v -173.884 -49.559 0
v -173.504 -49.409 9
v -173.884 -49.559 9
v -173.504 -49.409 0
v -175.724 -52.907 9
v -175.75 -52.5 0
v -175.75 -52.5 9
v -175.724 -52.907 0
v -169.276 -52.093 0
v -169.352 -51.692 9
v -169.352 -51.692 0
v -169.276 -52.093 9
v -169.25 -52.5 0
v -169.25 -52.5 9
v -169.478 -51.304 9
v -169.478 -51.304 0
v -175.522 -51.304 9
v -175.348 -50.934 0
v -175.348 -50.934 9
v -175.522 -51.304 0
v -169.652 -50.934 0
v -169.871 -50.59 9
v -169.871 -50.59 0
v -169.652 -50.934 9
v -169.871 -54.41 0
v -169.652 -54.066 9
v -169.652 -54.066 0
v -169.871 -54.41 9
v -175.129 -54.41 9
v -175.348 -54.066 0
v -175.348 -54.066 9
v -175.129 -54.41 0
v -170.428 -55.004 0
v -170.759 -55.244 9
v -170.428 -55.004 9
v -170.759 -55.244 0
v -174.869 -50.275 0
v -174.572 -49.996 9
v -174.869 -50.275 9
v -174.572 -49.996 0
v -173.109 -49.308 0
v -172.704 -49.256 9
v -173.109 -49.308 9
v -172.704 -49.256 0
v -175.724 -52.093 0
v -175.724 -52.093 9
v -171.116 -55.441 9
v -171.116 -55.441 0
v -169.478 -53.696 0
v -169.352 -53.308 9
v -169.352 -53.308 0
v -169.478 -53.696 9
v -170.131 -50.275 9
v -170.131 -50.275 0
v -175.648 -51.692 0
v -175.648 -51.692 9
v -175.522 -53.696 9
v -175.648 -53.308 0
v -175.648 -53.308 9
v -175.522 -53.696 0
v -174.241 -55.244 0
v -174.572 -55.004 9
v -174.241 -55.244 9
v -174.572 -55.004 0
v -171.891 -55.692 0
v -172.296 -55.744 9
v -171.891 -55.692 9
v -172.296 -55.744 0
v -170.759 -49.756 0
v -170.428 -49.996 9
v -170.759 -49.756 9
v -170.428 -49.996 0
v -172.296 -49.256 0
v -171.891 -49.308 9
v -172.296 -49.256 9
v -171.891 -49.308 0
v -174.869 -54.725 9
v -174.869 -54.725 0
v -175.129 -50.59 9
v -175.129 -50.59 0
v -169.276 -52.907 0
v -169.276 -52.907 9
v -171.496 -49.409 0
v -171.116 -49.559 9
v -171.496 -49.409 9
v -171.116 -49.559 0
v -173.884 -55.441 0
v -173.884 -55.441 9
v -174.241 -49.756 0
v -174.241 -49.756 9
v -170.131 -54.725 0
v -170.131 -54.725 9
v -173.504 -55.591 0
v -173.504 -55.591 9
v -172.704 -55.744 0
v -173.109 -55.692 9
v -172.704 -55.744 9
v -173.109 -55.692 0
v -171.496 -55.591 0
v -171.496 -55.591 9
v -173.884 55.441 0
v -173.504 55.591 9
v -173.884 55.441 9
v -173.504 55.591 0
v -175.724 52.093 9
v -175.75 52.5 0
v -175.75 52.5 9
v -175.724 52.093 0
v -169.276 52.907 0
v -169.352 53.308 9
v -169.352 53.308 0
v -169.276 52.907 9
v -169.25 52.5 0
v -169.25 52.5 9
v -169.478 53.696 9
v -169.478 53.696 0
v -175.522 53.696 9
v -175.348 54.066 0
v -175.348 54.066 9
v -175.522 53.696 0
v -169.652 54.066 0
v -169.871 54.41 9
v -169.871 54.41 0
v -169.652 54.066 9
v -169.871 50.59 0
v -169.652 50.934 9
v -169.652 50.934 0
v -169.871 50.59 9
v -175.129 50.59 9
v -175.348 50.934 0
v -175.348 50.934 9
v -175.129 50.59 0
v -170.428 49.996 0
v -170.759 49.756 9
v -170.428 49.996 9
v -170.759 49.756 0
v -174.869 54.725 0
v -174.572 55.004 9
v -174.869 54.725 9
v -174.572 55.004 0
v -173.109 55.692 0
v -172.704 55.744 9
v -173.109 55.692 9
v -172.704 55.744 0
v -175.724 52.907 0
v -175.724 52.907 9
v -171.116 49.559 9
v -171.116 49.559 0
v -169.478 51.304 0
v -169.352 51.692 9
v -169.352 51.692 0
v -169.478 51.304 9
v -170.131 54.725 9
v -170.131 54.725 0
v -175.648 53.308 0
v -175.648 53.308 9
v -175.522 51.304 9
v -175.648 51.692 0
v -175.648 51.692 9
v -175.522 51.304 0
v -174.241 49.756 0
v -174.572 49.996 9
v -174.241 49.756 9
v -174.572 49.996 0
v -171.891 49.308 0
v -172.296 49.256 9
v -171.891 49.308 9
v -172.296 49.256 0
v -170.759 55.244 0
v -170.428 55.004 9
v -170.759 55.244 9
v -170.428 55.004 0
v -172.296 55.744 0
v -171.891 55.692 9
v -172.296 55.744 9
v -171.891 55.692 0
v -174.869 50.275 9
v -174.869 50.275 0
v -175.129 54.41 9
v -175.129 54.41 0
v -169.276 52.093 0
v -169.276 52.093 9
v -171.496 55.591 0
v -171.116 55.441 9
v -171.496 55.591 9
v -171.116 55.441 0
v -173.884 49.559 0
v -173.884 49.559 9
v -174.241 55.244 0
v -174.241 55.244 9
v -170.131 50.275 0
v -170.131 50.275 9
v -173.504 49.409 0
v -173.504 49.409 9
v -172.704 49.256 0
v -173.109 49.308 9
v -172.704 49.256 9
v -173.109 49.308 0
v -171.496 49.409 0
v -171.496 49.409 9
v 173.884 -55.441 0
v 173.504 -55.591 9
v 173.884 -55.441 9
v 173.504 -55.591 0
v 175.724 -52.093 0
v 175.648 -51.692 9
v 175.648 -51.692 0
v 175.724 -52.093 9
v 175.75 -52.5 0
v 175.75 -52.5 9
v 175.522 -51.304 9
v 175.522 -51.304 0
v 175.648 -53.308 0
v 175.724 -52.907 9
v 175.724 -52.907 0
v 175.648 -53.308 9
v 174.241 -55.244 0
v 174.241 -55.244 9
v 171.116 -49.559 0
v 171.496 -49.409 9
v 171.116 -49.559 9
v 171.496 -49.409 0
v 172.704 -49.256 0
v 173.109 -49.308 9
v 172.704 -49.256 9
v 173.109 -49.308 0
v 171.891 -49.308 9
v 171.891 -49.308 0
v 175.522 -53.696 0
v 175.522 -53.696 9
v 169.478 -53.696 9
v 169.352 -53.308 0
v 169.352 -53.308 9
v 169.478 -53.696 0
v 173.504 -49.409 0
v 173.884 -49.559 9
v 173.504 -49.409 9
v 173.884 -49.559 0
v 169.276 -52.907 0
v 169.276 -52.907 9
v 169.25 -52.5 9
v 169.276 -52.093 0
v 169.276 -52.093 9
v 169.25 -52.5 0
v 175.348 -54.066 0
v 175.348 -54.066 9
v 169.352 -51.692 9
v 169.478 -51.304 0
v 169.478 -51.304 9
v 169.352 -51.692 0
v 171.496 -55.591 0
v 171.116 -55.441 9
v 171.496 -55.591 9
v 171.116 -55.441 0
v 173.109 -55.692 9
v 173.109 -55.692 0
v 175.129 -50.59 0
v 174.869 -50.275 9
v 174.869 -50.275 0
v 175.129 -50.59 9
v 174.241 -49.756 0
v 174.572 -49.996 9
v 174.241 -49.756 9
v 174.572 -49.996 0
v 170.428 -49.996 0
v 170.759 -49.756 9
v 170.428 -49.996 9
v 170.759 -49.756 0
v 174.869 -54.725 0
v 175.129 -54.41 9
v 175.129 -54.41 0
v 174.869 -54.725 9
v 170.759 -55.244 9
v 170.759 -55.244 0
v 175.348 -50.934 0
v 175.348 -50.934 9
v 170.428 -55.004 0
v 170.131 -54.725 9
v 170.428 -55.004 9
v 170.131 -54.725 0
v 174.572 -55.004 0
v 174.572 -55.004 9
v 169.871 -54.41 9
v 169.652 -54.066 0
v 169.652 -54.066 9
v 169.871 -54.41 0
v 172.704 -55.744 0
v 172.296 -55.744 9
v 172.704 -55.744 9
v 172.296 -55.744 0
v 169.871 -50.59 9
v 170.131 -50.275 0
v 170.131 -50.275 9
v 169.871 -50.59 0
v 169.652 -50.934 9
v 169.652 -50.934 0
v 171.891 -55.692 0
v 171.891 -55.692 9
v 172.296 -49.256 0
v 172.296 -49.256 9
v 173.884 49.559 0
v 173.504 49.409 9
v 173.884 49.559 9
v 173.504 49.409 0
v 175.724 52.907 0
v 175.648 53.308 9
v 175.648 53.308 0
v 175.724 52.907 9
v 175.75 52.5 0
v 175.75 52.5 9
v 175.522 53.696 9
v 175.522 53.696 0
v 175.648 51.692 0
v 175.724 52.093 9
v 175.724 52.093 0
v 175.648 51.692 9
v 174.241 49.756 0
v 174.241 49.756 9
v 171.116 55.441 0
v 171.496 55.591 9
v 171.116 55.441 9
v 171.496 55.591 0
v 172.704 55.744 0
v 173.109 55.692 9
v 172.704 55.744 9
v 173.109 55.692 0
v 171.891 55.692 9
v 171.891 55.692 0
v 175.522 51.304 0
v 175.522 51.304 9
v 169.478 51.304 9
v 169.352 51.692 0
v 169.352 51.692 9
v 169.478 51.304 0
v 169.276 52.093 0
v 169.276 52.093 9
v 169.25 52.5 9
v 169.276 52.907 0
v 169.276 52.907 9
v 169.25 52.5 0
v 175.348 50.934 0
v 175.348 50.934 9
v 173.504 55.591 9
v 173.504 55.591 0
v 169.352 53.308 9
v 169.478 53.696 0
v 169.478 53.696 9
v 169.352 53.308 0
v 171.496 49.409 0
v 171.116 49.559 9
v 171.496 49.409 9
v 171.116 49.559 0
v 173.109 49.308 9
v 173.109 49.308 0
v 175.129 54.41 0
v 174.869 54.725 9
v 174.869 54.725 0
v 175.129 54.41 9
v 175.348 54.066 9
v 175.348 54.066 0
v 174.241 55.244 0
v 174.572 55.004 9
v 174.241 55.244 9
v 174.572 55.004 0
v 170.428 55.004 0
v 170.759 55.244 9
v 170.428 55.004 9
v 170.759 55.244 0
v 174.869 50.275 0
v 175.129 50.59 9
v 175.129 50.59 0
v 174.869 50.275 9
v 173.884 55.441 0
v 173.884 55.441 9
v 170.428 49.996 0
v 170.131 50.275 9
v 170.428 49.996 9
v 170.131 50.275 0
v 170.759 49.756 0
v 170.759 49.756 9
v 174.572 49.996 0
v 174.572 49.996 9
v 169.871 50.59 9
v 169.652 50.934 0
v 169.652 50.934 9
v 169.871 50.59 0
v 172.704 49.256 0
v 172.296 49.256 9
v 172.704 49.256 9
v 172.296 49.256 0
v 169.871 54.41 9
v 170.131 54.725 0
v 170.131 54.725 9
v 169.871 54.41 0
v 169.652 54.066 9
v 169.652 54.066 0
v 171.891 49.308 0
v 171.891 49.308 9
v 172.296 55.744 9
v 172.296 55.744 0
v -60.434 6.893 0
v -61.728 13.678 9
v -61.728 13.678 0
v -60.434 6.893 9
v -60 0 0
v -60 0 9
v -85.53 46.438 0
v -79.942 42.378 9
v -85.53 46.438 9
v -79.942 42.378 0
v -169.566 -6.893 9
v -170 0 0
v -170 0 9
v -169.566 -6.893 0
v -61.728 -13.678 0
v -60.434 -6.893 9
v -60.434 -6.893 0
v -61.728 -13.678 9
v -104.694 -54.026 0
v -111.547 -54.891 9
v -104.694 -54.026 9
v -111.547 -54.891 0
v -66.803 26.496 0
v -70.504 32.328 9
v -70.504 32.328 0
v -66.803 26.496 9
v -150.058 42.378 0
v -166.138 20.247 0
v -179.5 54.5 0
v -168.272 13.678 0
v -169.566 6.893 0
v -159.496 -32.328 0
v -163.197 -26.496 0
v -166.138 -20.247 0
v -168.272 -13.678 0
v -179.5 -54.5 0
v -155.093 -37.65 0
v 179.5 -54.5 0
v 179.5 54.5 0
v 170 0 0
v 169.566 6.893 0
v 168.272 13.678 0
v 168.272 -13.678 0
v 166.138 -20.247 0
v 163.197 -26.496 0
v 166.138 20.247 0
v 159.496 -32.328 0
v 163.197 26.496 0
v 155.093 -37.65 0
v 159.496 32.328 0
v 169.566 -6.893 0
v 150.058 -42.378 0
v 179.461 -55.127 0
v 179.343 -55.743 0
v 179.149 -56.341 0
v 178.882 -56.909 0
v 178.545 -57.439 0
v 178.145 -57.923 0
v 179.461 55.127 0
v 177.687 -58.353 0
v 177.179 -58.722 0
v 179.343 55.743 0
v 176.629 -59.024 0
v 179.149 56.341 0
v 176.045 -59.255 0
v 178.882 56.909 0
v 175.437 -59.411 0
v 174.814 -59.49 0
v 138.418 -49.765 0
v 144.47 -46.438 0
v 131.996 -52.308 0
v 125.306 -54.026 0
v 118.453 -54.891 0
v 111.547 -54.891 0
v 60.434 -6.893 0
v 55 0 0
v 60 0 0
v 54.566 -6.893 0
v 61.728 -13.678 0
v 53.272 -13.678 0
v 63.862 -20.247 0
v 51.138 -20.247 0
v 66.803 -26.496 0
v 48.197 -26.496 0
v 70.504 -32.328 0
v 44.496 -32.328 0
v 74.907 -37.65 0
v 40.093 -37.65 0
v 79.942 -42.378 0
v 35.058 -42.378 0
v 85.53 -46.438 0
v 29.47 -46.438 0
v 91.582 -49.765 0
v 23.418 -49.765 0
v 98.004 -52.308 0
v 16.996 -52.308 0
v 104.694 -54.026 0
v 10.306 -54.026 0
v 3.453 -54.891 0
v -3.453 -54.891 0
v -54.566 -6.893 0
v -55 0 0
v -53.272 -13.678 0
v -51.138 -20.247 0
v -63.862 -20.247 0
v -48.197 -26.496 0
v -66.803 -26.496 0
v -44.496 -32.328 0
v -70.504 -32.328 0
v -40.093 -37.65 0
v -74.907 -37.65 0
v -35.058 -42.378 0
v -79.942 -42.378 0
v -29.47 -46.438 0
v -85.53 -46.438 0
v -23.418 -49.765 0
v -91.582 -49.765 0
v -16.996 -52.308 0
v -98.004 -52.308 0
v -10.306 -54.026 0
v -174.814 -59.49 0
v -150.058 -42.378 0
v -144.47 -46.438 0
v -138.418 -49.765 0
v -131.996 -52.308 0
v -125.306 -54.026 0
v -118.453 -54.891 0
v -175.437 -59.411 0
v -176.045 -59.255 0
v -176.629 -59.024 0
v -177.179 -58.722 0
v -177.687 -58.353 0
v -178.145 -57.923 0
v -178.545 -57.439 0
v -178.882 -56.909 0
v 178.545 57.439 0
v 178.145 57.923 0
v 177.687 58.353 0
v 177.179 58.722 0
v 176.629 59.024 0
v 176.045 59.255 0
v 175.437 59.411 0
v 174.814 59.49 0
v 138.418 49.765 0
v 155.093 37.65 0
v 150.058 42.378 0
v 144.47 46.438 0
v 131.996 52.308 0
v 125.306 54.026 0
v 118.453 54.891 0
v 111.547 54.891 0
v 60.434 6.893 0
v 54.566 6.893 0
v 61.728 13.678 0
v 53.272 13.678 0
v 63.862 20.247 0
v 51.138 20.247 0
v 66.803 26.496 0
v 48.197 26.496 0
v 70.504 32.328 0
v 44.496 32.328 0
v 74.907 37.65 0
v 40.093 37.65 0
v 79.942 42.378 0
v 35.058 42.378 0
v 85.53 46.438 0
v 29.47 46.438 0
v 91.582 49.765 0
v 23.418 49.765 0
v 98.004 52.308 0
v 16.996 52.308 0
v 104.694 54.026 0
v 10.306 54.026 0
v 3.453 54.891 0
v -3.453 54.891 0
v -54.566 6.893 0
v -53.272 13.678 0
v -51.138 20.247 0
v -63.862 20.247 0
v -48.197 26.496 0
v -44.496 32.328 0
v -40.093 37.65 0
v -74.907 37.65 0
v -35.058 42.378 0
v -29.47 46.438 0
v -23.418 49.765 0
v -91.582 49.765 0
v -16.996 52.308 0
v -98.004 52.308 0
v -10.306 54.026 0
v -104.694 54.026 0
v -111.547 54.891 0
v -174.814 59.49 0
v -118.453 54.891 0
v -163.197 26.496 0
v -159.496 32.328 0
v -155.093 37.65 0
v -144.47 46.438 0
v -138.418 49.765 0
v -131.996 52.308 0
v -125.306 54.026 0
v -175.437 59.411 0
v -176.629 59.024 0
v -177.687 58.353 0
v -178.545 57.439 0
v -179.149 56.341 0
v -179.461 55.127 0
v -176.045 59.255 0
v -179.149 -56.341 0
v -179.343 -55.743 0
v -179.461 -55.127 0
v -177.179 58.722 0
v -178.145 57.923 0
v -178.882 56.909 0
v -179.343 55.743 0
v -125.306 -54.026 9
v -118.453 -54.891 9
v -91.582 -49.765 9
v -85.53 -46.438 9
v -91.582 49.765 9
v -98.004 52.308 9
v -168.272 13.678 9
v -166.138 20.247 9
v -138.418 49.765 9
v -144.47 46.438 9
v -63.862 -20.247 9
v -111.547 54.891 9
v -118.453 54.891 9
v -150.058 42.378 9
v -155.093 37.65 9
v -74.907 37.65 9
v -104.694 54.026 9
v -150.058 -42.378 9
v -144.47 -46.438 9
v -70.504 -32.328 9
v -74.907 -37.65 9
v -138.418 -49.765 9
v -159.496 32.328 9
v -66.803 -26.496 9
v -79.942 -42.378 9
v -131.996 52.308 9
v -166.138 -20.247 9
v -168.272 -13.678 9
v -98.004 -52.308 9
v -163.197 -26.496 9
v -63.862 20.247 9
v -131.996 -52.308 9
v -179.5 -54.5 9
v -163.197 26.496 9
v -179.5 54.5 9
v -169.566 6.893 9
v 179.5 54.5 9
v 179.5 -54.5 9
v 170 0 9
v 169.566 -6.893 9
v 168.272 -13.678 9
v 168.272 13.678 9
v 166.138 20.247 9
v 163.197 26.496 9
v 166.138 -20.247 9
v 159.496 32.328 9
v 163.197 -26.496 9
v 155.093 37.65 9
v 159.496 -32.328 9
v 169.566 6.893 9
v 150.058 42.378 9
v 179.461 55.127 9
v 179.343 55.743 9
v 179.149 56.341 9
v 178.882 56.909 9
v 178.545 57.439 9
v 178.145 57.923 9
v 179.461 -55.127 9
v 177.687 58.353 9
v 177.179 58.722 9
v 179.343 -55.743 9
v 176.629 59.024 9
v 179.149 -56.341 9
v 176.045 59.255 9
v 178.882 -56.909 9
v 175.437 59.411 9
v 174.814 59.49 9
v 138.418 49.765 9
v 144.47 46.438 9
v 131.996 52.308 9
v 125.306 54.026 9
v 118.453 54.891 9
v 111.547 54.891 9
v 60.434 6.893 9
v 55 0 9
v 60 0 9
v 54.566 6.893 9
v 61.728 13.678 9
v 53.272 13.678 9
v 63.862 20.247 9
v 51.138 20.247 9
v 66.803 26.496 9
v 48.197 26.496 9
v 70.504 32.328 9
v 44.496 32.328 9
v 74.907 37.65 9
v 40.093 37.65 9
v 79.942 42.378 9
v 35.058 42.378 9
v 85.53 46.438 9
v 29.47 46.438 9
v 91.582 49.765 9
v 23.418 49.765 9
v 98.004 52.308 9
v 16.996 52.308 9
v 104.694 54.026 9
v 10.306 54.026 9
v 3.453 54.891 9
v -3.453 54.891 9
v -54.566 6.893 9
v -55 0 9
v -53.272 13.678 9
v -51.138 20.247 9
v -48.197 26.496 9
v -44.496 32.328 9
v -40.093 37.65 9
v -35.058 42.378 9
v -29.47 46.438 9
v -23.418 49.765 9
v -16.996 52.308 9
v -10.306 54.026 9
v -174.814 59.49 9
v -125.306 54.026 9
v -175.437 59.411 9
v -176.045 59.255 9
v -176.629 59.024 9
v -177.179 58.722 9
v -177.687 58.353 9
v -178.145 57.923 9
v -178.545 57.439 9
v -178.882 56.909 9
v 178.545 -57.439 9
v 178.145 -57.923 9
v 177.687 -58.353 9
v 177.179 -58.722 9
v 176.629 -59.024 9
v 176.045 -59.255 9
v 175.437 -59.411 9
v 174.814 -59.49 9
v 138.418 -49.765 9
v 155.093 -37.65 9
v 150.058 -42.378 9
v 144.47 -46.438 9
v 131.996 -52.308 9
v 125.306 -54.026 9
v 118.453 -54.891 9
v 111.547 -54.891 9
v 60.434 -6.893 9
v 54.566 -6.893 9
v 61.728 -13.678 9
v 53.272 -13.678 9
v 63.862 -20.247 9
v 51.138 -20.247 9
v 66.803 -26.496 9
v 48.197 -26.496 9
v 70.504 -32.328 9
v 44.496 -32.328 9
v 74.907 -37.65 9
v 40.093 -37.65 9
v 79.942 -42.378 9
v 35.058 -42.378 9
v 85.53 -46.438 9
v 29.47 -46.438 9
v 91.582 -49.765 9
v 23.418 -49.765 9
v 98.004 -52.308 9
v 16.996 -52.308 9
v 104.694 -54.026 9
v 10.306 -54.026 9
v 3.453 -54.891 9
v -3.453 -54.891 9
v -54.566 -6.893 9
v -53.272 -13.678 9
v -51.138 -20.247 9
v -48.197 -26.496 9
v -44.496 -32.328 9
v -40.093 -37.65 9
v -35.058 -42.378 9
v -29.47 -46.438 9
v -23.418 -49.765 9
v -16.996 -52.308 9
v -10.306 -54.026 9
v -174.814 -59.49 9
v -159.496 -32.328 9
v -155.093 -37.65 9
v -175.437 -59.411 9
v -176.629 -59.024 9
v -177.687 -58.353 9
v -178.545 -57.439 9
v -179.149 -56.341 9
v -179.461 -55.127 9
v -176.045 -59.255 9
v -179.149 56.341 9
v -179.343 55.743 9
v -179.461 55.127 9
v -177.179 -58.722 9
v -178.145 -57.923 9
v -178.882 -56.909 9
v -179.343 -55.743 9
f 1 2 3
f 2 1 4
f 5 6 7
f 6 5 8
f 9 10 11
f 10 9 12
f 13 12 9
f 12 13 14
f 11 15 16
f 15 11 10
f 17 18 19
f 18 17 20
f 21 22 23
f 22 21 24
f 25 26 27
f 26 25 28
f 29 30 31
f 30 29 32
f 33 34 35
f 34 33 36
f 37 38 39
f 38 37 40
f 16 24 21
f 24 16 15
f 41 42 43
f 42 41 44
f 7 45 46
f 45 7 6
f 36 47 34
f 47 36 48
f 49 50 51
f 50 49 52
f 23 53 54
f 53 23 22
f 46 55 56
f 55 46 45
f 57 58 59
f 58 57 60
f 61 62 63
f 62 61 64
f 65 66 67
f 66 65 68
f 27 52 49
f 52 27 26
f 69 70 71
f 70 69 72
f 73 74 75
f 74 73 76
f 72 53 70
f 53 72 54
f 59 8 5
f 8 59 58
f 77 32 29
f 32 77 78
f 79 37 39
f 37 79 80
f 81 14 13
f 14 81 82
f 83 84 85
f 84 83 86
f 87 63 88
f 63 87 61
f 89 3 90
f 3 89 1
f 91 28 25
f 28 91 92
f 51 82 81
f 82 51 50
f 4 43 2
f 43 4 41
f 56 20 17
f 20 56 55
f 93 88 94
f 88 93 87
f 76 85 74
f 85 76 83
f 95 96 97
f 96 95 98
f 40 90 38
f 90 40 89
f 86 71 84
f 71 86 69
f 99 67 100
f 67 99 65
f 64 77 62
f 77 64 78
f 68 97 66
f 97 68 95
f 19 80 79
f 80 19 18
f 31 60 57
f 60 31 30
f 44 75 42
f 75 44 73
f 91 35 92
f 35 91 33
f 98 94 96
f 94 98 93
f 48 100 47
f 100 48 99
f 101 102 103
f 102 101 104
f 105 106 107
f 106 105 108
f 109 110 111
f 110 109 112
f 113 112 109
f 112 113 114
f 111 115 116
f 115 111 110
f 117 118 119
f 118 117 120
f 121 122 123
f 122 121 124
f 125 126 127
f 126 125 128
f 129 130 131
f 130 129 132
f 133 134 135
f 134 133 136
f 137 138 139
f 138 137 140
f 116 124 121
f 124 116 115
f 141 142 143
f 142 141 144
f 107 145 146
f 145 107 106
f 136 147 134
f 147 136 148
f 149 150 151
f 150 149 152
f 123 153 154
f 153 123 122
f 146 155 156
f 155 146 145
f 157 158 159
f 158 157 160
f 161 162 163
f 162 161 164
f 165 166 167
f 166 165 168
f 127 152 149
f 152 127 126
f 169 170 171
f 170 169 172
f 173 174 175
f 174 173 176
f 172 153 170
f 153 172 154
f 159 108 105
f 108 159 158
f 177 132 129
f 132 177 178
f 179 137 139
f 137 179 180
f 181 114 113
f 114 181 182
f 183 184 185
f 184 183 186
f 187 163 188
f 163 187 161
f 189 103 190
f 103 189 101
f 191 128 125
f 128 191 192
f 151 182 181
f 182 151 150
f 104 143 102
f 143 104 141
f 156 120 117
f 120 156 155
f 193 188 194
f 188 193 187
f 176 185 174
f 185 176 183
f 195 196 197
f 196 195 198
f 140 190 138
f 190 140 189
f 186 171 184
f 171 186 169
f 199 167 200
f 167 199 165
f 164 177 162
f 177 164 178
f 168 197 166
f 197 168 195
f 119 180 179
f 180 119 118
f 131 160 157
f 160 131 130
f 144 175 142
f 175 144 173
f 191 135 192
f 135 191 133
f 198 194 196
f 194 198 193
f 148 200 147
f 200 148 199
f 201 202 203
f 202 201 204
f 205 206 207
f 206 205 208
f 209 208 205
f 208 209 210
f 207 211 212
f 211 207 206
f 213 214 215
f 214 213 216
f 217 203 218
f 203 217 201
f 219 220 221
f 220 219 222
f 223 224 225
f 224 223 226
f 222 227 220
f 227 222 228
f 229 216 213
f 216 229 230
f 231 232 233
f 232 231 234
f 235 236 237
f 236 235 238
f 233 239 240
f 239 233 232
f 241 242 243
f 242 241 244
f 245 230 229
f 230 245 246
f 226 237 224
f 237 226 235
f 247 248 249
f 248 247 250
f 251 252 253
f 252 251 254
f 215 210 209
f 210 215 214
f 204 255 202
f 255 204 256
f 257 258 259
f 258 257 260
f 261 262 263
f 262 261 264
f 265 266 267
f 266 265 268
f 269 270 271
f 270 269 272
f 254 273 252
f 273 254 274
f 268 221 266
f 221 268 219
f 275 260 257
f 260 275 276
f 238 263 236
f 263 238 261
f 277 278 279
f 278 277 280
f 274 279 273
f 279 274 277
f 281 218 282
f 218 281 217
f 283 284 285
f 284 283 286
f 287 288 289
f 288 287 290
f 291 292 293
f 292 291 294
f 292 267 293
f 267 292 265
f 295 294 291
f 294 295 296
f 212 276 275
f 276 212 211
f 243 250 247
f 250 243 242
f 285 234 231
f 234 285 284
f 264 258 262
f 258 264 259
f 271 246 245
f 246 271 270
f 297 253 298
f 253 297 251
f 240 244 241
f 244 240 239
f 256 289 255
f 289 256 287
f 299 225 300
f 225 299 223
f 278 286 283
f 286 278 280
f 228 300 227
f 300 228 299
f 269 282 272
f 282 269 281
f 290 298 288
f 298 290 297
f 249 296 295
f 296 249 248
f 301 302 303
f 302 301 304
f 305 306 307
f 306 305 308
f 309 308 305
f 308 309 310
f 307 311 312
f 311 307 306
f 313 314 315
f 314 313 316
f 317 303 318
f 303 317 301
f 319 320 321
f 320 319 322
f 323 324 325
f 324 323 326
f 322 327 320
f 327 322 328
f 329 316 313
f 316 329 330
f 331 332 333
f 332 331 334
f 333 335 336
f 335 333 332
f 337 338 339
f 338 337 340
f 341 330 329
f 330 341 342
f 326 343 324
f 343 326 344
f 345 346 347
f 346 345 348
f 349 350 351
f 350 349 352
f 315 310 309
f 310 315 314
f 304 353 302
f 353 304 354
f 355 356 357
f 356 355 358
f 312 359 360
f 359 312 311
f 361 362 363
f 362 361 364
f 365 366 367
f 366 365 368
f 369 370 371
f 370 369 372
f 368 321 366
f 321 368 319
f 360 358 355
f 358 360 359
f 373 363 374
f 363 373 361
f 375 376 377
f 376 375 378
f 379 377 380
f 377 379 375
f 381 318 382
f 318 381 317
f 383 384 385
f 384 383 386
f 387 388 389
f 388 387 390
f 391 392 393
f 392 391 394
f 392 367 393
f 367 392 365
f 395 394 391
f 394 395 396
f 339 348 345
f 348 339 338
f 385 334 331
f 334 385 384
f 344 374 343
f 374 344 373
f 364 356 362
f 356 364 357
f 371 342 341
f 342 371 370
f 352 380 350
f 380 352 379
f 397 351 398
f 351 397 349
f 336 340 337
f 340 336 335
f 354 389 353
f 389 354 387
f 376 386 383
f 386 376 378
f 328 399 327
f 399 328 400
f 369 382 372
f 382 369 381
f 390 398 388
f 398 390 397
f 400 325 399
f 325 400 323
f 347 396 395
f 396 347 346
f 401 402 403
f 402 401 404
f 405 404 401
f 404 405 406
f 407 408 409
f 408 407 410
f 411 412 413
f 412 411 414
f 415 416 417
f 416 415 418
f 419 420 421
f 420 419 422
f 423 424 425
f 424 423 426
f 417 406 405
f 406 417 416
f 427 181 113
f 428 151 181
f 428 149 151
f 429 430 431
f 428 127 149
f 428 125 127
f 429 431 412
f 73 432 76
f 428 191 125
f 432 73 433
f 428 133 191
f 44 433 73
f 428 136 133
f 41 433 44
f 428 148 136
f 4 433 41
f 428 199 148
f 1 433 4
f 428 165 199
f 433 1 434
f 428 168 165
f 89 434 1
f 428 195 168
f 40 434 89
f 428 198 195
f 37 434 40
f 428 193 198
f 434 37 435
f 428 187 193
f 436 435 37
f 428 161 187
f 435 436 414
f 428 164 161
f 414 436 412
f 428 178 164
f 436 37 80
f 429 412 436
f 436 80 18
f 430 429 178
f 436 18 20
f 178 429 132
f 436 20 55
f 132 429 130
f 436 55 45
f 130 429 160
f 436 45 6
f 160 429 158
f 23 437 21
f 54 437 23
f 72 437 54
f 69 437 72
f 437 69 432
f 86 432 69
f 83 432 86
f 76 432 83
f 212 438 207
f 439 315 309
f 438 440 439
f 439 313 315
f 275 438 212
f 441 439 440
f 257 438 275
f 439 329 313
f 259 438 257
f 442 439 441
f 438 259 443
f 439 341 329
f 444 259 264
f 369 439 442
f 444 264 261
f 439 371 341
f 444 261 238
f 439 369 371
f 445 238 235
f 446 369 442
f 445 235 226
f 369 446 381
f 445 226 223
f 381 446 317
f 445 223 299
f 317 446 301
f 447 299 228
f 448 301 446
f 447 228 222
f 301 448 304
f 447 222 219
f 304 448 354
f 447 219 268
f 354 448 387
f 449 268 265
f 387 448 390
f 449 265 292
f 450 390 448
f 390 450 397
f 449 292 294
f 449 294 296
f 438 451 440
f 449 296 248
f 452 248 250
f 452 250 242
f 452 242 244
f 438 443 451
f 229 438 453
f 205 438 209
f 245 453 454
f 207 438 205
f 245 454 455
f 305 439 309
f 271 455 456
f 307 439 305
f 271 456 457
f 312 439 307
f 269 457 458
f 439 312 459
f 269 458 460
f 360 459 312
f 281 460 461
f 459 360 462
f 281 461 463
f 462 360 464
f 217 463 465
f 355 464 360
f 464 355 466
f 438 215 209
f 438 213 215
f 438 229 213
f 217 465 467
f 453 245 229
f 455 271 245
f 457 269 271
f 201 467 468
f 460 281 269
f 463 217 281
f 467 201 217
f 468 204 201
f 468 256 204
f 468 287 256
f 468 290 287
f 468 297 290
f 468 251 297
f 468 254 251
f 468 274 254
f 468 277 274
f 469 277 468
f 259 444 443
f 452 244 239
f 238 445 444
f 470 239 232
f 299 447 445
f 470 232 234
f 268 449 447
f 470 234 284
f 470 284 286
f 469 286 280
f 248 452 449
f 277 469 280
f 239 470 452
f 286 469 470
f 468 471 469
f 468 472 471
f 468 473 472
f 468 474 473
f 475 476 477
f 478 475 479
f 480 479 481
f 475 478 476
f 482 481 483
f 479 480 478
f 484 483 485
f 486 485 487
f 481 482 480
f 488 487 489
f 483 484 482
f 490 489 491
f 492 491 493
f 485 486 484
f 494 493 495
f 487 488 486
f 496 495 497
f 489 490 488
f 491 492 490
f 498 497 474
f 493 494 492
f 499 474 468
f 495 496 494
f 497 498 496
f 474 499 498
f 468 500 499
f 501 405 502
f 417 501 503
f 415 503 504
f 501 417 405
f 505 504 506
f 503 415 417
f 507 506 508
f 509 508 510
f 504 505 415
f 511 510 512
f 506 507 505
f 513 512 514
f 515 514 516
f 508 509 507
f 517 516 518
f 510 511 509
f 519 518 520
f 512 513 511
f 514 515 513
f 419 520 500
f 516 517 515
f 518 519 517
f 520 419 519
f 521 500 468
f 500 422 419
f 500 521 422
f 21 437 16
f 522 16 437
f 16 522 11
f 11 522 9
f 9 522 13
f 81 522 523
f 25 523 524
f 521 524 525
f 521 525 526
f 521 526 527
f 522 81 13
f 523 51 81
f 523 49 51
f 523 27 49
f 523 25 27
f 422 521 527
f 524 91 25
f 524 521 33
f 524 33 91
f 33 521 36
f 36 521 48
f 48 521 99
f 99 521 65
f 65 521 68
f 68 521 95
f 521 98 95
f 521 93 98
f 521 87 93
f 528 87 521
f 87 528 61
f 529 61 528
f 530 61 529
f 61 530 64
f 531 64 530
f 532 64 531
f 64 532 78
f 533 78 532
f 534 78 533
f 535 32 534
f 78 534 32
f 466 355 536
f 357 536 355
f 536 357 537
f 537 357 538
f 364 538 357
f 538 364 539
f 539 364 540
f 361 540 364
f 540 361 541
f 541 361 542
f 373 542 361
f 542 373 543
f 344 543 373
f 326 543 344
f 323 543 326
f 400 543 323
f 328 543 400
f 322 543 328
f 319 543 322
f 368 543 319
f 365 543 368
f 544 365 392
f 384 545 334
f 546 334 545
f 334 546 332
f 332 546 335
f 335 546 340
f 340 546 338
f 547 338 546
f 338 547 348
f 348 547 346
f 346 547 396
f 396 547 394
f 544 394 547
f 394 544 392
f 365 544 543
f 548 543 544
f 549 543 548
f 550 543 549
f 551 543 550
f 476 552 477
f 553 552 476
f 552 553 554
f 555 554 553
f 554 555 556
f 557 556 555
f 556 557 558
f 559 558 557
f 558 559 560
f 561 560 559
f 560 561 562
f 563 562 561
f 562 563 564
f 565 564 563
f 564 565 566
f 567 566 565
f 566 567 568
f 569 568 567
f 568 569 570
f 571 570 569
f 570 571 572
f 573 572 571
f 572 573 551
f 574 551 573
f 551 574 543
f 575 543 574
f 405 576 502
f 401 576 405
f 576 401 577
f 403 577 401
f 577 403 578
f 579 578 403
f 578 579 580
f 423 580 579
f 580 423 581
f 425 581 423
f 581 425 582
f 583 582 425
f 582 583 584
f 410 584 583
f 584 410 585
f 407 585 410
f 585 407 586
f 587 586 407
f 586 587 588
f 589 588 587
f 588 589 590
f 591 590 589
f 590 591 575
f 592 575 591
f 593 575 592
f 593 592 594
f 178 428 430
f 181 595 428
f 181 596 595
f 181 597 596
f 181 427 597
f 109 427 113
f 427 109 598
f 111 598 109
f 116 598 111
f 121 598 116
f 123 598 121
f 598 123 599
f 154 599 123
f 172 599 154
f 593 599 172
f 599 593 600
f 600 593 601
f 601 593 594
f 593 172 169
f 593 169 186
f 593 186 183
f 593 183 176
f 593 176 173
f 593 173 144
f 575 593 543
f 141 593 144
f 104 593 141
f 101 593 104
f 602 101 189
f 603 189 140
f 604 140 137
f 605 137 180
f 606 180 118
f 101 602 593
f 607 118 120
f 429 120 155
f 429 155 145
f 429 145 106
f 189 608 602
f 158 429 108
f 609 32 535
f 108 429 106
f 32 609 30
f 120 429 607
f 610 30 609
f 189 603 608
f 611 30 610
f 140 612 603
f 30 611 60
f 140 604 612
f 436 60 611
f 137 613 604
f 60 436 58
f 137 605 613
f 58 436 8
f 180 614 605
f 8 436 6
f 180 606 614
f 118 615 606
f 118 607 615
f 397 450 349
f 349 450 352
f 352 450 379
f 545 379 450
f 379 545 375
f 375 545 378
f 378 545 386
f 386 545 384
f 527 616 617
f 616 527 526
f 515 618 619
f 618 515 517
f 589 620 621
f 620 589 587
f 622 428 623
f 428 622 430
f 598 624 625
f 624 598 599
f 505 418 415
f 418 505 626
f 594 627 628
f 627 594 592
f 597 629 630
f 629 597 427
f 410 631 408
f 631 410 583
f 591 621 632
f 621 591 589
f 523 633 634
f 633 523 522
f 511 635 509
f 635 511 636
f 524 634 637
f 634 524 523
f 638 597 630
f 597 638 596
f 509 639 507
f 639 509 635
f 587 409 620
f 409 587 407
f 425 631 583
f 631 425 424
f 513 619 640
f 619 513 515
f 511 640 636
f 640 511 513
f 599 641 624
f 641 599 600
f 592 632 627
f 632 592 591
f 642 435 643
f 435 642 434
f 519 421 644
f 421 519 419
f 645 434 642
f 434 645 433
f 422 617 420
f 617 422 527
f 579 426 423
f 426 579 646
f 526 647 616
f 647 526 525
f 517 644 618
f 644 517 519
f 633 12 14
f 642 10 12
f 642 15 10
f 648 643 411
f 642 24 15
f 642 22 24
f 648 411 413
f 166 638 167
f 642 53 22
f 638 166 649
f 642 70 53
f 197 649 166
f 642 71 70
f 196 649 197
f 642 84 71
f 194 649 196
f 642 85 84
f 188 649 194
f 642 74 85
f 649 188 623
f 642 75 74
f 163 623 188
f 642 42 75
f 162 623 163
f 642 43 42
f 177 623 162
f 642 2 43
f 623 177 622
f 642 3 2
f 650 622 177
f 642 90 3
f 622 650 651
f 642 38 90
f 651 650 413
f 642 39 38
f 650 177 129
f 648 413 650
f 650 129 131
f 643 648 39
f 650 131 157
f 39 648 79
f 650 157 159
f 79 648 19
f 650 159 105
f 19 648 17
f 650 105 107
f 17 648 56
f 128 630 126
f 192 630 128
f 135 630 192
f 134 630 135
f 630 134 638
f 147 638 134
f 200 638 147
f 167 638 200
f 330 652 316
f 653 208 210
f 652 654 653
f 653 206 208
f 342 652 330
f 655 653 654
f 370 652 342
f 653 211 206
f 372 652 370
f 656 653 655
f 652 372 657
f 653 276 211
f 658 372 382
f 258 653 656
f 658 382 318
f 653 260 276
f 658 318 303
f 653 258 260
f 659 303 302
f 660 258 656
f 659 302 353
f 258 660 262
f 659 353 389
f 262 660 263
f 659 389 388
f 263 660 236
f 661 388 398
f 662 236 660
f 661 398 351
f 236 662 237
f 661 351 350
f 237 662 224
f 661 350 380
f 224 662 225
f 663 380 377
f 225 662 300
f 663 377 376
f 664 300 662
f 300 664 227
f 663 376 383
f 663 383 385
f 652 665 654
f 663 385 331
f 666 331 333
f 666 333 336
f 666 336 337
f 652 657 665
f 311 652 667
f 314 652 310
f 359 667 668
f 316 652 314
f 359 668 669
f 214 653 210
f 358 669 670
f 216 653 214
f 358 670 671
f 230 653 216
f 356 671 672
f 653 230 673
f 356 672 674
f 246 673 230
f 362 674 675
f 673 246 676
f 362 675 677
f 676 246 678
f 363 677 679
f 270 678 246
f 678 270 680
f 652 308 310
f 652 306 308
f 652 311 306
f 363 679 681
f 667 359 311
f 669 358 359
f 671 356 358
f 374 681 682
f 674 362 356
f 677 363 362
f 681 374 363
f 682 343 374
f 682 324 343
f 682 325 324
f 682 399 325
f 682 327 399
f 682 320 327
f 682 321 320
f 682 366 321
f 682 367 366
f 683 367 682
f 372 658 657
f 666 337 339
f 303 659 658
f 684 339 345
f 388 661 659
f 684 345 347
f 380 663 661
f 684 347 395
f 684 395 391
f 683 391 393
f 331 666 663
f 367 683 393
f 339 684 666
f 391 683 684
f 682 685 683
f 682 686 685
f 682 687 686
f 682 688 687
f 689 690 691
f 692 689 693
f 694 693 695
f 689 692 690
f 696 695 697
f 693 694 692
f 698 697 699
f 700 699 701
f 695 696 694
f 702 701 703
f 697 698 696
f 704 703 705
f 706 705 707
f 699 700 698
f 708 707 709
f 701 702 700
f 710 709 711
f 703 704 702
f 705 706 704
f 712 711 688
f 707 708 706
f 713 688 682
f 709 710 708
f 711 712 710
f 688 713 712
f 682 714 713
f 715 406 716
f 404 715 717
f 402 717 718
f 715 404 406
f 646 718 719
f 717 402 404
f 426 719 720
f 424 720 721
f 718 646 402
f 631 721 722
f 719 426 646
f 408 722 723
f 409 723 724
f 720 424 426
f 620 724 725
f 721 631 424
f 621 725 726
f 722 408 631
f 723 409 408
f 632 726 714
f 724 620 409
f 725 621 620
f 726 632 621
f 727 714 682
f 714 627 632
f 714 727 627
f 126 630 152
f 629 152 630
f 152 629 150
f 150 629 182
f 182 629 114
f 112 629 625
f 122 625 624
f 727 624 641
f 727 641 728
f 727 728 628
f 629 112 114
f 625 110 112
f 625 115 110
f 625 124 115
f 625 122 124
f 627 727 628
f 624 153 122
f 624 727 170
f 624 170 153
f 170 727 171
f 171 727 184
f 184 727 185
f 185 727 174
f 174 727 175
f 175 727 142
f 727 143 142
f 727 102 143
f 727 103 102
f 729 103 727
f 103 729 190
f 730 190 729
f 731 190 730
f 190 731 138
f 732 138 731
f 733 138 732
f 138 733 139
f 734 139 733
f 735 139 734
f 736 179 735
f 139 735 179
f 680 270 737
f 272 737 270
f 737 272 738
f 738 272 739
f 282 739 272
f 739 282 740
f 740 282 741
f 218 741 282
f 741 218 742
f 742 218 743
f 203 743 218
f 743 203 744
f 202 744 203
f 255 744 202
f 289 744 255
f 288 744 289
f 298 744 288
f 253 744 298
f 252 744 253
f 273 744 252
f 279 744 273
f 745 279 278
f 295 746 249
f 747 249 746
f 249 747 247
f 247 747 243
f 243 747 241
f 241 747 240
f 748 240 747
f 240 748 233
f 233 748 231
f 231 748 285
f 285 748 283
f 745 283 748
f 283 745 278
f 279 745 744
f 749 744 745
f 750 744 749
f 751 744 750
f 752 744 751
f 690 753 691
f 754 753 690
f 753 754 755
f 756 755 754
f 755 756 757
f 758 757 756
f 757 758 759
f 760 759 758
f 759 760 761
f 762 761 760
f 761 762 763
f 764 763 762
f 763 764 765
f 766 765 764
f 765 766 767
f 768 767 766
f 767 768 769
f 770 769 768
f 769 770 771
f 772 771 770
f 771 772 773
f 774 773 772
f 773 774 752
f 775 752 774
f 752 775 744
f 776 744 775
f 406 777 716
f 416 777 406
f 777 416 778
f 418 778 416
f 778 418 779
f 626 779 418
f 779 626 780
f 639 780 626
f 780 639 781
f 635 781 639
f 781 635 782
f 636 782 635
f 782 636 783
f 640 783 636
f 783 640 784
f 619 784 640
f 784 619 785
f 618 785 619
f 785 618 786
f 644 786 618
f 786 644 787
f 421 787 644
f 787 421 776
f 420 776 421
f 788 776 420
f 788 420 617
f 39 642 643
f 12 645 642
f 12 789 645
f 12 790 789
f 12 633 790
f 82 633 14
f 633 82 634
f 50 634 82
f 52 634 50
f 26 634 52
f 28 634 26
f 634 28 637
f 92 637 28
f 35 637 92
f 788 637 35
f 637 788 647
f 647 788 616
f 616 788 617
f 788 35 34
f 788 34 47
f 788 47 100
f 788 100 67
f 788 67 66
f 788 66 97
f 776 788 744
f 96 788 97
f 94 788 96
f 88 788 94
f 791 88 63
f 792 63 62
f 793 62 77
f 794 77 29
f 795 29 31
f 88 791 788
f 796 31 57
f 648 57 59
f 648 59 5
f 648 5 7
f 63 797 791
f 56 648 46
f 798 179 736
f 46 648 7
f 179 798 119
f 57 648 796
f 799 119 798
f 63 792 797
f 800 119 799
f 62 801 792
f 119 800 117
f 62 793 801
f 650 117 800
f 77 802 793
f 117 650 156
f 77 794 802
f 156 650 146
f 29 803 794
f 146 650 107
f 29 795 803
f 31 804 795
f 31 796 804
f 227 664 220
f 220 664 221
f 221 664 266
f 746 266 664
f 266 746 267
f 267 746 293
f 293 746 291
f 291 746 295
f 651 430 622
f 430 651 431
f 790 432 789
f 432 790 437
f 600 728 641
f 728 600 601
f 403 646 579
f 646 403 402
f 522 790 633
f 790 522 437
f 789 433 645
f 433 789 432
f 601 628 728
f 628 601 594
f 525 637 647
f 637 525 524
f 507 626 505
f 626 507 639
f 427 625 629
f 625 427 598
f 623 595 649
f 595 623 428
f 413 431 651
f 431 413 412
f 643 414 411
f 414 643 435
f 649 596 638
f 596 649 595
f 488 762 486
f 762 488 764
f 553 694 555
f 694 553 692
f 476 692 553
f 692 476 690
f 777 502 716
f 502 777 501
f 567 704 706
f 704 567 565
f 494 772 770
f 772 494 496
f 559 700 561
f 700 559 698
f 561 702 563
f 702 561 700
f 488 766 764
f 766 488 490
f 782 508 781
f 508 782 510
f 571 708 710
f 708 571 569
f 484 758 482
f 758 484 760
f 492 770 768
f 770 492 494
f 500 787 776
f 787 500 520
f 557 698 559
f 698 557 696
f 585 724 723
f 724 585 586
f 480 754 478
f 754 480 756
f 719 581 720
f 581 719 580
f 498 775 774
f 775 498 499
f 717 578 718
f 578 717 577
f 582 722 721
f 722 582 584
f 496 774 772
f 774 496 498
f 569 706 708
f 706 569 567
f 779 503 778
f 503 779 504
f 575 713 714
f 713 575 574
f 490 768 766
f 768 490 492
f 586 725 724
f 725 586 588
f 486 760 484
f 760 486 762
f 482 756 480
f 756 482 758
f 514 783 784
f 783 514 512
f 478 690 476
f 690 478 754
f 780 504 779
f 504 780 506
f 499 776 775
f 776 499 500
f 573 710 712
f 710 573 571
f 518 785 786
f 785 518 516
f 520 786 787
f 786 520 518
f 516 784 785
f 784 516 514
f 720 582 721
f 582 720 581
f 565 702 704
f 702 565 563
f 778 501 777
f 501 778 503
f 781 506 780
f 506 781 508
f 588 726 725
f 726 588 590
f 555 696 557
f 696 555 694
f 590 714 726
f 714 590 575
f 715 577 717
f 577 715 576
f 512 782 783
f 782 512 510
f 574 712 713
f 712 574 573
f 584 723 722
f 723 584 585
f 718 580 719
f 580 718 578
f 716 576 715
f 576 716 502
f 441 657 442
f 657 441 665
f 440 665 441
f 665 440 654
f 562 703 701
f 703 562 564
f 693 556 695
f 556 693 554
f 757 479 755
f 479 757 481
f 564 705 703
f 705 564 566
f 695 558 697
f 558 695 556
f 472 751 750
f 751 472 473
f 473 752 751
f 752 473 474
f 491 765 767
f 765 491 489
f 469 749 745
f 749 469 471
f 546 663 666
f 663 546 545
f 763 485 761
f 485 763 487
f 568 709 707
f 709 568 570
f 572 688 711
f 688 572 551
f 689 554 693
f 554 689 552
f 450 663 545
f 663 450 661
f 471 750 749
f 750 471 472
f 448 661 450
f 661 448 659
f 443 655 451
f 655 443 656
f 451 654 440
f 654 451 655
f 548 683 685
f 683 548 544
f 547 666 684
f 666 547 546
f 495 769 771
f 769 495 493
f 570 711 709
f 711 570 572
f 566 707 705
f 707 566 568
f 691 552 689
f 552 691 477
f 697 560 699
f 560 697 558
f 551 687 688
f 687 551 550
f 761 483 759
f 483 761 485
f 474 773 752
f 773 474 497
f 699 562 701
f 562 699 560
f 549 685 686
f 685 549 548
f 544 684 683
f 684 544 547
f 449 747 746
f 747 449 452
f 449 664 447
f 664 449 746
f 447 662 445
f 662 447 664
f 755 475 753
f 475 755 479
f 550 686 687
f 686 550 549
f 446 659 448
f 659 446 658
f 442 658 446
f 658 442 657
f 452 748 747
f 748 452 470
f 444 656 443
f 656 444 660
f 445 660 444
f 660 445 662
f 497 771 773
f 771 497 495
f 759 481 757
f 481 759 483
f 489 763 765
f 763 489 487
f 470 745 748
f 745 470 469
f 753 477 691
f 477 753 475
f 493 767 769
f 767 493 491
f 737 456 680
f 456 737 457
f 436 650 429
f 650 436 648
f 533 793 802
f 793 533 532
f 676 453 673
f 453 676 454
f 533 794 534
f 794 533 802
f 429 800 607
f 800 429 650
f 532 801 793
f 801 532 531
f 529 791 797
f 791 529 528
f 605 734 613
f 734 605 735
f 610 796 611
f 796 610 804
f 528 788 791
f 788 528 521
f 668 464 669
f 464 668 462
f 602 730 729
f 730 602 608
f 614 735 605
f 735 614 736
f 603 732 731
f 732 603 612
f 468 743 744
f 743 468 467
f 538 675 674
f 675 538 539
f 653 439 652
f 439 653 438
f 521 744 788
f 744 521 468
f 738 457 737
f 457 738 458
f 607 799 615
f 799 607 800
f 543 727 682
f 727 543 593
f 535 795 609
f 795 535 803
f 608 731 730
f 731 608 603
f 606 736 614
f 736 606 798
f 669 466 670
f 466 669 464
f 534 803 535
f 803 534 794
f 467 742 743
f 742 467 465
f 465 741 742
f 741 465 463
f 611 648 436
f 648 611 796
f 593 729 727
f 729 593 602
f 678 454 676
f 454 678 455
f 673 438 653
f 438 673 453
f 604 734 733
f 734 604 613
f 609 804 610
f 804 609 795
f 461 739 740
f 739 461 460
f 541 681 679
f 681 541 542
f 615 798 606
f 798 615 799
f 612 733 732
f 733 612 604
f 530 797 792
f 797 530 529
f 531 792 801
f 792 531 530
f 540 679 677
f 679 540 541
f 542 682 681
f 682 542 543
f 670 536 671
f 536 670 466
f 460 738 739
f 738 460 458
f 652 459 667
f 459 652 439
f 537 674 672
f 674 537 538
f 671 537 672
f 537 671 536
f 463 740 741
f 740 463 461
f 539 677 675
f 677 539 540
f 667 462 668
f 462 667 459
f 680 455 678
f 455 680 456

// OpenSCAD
$fn = 50;


difference() {
	union() {
		hull() {
			translate(v = [-174.5000000000, 54.5000000000, 0]) {
				cylinder(h = 9, r = 5);
			}
			translate(v = [174.5000000000, 54.5000000000, 0]) {
				cylinder(h = 9, r = 5);
			}
			translate(v = [-174.5000000000, -54.5000000000, 0]) {
				cylinder(h = 9, r = 5);
			}
			translate(v = [174.5000000000, -54.5000000000, 0]) {
				cylinder(h = 9, r = 5);
			}
		}
	}
	union() {
		#translate(v = [-172.5000000000, -52.5000000000, -100.0000000000]) {
			cylinder(h = 200, r = 3.2500000000);
		}
		#translate(v = [-172.5000000000, 52.5000000000, -100.0000000000]) {
			cylinder(h = 200, r = 3.2500000000);
		}
		#translate(v = [172.5000000000, -52.5000000000, -100.0000000000]) {
			cylinder(h = 200, r = 3.2500000000);
		}
		#translate(v = [172.5000000000, 52.5000000000, -100.0000000000]) {
			cylinder(h = 200, r = 3.2500000000);
		}
		#translate(v = [-115.0000000000, 0, 0]) {
			cylinder(h = 9, r = 55.0000000000);
		}
		#cylinder(h = 9, r = 55.0000000000);
		#translate(v = [115.0000000000, 0, 0]) {
			cylinder(h = 9, r = 55.0000000000);
		}
	}
}
